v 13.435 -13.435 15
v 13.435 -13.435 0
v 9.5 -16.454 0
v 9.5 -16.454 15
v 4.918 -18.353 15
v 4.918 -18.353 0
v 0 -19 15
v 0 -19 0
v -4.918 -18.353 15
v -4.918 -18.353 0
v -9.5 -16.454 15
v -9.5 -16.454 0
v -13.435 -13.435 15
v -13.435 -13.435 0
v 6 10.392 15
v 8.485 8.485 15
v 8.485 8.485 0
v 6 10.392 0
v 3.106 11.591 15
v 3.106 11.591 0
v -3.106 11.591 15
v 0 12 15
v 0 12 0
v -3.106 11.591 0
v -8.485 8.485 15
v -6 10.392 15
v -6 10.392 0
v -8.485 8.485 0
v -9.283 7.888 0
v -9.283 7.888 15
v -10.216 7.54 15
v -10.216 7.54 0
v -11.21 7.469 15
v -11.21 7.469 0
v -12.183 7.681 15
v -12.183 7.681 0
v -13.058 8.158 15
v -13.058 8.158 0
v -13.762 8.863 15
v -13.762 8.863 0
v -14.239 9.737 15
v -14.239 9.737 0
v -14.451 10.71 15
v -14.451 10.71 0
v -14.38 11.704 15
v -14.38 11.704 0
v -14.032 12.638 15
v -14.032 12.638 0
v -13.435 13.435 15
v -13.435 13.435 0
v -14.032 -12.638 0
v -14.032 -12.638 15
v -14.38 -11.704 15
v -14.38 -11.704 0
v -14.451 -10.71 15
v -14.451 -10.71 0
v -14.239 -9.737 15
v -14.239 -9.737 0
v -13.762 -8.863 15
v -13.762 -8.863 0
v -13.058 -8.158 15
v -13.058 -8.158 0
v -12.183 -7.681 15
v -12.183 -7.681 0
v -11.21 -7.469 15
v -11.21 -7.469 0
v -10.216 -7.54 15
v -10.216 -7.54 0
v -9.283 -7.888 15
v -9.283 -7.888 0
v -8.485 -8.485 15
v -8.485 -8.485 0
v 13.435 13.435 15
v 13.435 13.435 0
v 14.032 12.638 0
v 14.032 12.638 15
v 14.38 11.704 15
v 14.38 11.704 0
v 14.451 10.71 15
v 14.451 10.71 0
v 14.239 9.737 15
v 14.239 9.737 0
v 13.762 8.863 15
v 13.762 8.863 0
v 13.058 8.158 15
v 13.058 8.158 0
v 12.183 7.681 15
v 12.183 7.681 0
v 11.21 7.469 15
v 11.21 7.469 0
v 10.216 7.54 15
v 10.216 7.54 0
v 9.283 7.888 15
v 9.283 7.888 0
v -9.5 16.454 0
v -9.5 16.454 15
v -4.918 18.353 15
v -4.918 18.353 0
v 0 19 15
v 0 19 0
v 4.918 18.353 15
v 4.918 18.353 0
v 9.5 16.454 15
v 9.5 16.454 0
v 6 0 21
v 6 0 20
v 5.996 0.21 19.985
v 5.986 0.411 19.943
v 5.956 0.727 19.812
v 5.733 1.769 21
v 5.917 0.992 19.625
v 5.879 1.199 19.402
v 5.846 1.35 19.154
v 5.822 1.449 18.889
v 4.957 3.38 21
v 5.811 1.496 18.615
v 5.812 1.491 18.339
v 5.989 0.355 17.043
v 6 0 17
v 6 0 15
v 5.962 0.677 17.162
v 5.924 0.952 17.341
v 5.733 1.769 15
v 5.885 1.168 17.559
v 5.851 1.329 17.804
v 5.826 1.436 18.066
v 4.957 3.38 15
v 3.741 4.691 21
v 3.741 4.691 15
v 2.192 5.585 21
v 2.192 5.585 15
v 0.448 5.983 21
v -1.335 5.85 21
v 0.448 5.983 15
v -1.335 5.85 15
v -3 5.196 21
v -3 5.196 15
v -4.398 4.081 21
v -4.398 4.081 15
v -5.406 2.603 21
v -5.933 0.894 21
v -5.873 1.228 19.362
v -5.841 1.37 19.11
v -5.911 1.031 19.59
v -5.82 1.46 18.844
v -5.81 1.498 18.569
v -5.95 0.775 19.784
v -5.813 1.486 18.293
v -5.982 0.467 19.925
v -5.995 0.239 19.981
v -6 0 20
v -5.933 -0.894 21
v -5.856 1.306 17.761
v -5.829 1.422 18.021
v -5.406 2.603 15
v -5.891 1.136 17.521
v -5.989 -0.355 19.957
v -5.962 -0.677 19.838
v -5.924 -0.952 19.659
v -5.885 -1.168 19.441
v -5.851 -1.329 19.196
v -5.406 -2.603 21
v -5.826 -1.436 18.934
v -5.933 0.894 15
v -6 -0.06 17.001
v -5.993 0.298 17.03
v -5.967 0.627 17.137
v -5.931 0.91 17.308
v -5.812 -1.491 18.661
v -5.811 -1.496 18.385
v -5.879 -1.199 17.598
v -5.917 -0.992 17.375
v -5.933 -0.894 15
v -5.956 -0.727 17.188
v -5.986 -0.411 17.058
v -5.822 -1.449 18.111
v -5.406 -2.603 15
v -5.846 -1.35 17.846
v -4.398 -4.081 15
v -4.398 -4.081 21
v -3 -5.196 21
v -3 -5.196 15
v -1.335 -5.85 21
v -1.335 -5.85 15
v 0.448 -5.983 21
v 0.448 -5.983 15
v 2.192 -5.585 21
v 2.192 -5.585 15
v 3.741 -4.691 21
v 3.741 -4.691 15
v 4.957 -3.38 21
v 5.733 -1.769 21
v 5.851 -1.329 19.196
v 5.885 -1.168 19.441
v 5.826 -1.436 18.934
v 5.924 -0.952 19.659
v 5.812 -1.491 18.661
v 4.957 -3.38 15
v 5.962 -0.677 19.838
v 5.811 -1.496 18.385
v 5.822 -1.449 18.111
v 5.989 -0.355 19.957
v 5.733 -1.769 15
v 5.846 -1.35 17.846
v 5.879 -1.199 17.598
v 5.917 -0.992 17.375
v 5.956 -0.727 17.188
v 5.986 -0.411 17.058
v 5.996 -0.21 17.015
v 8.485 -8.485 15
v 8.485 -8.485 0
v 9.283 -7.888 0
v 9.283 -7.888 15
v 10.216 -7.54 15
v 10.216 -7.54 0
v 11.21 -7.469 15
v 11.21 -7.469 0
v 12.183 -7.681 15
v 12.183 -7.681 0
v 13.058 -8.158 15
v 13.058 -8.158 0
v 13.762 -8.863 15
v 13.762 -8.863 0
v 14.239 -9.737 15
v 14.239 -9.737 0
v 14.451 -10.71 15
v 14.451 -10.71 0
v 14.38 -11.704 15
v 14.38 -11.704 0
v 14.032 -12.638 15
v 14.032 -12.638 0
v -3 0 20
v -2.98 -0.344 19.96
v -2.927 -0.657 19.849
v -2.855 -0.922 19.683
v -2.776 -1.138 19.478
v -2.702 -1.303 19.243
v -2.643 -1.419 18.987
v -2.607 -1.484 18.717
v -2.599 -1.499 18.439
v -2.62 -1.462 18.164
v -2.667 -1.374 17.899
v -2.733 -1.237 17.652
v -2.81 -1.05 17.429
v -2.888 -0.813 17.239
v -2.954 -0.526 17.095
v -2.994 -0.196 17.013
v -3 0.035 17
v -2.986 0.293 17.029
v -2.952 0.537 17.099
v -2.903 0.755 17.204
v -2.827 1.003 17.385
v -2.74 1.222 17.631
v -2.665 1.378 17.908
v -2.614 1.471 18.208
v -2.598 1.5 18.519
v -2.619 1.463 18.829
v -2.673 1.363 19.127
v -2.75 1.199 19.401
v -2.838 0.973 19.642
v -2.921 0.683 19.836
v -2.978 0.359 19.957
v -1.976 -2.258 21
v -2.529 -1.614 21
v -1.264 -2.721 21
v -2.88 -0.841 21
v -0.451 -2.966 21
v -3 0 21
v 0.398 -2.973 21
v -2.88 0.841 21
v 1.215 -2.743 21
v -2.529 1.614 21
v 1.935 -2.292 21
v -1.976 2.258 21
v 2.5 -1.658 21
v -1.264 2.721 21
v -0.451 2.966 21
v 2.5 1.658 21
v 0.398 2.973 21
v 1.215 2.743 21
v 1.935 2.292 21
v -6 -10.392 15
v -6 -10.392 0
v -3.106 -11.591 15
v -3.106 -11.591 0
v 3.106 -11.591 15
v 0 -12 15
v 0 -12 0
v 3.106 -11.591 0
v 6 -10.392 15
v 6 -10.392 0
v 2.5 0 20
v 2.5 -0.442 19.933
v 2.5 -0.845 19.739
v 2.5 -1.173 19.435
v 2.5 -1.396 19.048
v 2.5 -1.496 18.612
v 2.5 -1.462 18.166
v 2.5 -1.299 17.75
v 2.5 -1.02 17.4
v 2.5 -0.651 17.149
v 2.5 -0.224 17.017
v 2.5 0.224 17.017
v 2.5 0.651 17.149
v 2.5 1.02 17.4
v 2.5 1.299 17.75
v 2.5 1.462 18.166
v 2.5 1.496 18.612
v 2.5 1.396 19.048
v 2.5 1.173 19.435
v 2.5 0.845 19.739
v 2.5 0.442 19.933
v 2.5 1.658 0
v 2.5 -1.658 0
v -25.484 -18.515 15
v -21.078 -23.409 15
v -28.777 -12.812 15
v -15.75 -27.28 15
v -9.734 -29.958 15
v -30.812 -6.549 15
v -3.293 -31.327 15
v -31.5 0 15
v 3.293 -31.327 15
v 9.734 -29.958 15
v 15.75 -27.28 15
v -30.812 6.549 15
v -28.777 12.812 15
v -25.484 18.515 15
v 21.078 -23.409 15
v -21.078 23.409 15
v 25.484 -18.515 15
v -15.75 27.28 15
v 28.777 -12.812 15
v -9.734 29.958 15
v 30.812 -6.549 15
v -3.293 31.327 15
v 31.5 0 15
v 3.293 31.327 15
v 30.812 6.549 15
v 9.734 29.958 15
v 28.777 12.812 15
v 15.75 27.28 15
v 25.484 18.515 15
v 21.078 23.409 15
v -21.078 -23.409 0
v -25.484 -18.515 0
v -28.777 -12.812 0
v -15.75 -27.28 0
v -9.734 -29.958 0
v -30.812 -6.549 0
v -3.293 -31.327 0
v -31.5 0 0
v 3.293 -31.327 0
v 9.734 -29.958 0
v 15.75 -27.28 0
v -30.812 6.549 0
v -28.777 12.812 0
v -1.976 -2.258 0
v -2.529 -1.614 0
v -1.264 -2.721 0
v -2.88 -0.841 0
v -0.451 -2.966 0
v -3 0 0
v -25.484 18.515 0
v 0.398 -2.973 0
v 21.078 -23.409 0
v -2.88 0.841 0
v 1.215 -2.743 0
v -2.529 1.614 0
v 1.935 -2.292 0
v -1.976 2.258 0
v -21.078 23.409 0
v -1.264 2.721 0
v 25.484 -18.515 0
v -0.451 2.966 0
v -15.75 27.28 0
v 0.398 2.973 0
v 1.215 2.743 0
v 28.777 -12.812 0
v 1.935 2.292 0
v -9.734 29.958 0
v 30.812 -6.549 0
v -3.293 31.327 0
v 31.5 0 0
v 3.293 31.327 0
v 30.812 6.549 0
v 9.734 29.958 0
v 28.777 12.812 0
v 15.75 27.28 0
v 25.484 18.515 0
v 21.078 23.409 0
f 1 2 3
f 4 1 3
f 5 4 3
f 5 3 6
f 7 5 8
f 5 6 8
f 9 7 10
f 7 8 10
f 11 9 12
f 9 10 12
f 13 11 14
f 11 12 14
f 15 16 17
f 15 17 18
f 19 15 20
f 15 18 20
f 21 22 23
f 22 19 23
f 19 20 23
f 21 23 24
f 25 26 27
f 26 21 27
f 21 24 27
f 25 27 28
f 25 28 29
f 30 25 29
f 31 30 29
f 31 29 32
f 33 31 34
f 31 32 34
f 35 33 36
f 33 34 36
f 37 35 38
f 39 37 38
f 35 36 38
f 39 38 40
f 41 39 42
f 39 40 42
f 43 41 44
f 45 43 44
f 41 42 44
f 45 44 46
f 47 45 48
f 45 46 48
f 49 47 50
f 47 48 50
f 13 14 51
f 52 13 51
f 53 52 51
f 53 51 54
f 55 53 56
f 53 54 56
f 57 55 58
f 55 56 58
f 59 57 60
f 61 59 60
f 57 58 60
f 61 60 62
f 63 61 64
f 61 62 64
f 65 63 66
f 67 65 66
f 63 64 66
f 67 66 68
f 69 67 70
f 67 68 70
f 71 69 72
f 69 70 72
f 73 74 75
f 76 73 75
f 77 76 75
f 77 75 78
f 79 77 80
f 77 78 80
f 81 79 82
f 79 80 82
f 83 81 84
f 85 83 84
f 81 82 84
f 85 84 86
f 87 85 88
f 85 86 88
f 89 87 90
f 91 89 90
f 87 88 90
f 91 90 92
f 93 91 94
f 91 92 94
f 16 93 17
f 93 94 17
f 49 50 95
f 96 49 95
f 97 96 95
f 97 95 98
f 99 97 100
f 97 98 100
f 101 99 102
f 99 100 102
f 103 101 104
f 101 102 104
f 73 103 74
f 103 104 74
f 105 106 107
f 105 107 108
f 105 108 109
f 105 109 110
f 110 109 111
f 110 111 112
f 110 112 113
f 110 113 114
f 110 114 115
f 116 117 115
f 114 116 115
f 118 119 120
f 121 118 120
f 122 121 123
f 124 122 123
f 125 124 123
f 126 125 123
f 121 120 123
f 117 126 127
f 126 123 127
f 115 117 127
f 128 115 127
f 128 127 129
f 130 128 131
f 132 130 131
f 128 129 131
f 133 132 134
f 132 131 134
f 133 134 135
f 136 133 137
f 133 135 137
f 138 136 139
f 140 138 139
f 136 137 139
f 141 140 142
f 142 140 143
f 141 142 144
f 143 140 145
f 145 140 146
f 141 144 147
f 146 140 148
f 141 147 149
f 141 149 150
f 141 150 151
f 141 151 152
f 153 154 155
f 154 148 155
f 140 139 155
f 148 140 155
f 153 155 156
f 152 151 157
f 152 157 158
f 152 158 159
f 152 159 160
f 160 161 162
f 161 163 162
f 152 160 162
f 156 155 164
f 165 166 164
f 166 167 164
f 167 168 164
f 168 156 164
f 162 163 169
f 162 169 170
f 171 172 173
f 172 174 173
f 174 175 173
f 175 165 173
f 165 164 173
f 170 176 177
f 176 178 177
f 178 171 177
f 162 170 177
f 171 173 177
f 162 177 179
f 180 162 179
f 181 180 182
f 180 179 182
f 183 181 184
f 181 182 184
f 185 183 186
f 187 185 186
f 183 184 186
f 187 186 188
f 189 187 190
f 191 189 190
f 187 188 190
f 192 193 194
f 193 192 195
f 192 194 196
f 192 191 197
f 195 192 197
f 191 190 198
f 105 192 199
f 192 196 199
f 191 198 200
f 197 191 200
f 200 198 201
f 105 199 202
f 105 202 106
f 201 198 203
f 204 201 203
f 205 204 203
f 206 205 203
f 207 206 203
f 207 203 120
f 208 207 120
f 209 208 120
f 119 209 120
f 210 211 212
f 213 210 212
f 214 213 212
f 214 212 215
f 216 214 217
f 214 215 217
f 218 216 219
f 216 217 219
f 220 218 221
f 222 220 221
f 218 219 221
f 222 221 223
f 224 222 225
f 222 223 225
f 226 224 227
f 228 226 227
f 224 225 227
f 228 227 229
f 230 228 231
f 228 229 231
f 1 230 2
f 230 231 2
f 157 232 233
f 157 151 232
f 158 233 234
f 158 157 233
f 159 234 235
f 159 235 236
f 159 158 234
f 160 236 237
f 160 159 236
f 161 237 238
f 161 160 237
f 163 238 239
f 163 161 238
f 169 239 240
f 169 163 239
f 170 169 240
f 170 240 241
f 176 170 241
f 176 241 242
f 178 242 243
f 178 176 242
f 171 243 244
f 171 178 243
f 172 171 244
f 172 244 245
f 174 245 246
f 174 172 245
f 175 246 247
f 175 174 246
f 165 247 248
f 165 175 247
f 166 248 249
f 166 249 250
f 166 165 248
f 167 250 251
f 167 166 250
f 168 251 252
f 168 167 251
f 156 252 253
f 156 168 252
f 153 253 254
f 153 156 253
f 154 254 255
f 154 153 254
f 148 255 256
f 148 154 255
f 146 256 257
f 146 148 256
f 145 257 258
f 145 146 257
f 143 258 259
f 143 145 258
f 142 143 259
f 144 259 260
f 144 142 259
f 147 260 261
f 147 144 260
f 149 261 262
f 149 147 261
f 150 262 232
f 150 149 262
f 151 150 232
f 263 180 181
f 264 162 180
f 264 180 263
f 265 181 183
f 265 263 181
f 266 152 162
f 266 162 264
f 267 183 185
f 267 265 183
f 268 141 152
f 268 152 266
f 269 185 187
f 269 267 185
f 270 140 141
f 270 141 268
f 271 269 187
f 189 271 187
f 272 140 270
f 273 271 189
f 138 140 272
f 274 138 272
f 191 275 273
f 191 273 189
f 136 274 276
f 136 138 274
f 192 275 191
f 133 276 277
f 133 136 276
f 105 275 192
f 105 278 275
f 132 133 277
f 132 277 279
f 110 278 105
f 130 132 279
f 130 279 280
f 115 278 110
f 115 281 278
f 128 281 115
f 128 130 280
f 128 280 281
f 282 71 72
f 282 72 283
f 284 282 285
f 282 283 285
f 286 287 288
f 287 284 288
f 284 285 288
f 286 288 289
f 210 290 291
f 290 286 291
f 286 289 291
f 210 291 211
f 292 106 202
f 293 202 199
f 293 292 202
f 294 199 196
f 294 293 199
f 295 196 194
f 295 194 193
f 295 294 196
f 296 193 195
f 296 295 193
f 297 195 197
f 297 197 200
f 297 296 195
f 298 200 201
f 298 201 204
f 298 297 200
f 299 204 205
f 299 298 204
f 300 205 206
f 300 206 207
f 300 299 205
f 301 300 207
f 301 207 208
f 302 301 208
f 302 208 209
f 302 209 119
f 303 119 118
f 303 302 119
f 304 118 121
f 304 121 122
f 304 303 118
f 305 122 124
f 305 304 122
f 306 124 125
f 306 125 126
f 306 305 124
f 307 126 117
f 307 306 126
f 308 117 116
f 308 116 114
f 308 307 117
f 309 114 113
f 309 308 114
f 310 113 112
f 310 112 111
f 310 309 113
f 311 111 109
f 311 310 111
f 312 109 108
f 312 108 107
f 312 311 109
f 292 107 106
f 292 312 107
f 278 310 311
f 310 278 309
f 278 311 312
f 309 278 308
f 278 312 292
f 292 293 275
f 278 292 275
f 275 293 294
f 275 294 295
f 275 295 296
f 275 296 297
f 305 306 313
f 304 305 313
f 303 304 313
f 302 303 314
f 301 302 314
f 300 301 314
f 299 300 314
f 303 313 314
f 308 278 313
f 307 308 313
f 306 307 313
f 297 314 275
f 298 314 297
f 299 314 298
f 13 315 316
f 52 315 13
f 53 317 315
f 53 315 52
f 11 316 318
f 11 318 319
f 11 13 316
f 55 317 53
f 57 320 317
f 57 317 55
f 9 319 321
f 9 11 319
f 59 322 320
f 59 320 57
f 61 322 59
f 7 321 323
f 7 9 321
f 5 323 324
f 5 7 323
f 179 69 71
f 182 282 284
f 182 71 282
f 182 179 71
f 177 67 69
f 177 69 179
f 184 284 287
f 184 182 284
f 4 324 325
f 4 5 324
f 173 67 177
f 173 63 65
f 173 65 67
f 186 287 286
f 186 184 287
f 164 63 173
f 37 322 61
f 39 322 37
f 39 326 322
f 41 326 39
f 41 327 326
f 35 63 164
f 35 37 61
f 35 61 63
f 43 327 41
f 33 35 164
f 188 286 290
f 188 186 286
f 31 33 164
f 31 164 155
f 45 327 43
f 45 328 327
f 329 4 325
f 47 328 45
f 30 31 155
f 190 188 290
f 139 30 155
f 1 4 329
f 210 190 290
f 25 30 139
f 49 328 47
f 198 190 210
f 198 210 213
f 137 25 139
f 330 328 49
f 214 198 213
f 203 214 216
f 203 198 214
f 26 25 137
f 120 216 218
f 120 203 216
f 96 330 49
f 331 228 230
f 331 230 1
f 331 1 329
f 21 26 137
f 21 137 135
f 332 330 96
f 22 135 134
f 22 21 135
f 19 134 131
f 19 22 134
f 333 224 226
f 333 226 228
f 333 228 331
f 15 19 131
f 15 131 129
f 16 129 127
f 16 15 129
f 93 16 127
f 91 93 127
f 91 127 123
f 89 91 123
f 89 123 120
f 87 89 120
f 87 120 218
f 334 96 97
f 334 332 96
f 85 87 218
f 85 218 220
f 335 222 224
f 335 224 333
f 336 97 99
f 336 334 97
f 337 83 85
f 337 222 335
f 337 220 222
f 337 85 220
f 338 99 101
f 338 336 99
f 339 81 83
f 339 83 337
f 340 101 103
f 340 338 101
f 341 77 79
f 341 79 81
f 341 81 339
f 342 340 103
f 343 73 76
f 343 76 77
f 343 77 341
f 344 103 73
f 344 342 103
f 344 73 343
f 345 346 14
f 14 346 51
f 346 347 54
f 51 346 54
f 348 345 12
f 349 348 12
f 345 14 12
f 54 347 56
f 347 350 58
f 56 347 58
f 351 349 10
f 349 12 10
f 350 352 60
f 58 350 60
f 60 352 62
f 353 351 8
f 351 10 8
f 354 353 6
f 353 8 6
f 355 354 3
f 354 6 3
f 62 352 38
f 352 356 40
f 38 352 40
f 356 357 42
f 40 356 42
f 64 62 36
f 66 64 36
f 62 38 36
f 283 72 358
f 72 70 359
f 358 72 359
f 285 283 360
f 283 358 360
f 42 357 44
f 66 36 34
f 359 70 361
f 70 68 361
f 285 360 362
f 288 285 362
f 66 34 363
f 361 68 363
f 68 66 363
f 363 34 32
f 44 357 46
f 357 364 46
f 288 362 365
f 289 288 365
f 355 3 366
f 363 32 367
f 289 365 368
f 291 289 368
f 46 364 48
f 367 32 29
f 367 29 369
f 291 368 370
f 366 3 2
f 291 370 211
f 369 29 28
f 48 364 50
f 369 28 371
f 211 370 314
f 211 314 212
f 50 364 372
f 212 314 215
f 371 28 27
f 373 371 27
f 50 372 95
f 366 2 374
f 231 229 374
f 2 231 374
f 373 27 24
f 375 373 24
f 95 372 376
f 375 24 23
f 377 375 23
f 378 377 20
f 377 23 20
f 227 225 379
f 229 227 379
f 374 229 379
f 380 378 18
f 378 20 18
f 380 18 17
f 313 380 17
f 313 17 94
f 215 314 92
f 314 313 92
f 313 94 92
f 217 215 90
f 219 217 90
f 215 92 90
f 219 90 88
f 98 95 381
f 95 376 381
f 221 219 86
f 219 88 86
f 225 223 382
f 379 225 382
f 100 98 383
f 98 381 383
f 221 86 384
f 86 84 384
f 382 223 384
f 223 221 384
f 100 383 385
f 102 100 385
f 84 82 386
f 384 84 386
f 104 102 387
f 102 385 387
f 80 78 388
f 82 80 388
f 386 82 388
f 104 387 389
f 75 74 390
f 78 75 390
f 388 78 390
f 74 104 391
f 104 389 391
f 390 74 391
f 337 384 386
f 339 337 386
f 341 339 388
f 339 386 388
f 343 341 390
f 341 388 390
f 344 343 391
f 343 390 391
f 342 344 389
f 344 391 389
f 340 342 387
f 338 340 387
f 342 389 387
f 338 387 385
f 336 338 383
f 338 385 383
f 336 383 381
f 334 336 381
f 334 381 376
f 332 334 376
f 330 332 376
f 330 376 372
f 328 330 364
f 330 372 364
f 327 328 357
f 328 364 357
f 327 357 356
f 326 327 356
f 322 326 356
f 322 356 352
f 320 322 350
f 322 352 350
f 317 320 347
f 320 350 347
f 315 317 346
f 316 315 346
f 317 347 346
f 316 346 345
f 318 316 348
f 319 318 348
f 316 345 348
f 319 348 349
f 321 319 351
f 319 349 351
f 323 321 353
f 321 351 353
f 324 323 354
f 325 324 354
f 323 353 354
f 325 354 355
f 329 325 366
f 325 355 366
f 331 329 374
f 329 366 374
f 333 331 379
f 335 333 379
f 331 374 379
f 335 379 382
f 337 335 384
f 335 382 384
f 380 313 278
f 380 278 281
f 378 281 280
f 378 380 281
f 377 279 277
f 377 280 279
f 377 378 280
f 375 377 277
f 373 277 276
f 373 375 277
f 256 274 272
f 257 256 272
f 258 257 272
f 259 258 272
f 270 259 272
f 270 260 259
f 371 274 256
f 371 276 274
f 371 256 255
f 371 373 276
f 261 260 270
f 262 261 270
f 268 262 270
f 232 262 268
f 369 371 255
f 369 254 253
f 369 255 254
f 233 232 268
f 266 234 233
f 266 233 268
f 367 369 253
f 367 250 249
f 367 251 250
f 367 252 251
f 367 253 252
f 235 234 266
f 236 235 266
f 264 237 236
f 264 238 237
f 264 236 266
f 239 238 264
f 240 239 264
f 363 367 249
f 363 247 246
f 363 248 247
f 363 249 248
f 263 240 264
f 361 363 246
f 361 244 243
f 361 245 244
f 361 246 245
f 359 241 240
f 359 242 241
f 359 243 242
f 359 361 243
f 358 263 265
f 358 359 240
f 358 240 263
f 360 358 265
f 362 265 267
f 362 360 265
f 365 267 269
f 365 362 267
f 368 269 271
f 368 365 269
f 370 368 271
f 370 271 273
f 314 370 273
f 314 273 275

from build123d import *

# Parameters (mm, degrees)
SKETCH_1_R               = 31.5
EXTRUDE_1_DEPTH          = 15
SKETCH_3_R               = 3
CUT_EXTRUDE_2_DEPTH      = 48.005318848
SKETCH_14_R              = 6
SKETCH_14_R_2            = 3
EXTRUDE_3_DEPTH          = 6
EXTRUDE_START            = -21
EXTRUDE_4_DEPTH          = 21
CUT_EXTRUDE_3_DEPTH      = 50.249365478
CUT_EXTRUDE_3_DEPTH_BACK = 50.249365478
SKETCH_18_R              = 1.5
CUT_EXTRUDE_5_DEPTH      = 48.00531888
CUT_EXTRUDE_5_DEPTH_BACK = 48.00531888


with BuildPart() as part:
    # 草图1 → 凸台-拉伸1 (new body)
    with BuildSketch(Plane.XY):
        Circle(SKETCH_1_R)
    extrude(amount=EXTRUDE_1_DEPTH)

    # 草图3 → 切除-拉伸2 (cut, through all)
    with BuildSketch(Plane(origin=(0, 0, 0), x_dir=(-1, 0, 0), z_dir=(0, 0, -1))):
        Circle(SKETCH_3_R)
    extrude(amount=-CUT_EXTRUDE_2_DEPTH, mode=Mode.SUBTRACT)

    # 草图14 → 凸台-拉伸3 (add)
    with BuildSketch(Plane.XY.offset(15)):
        Circle(SKETCH_14_R)
        with Locations(Location((0, 0, 0), (0, 0, 180))):
            Circle(SKETCH_14_R_2, mode=Mode.SUBTRACT)
    extrude(amount=EXTRUDE_3_DEPTH)

    # 草图19 → 凸台-拉伸4 (add)
    with BuildSketch(Plane.XY.offset(21).offset(EXTRUDE_START)):
        with BuildLine():
            Line((2.5, 1.658312395), (2.5, -1.658312395))
            ThreePointArc((2.5, -1.658312395), (3, 0), (2.5, 1.658312395))
        make_face()
    extrude(amount=EXTRUDE_4_DEPTH)

    # 草图18 → 切除-拉伸3 (cut, two sides: drawn at the far end of the back side and taken through both)
    with BuildSketch(Plane(origin=(0, 0, 0), x_dir=(0, 0, -1), z_dir=(1, 0, 0)).offset(-CUT_EXTRUDE_3_DEPTH_BACK)):
        with Locations(Location((-18.5, 0, 0), (0, 0, 180))):
            Circle(SKETCH_18_R)
    extrude(amount=CUT_EXTRUDE_3_DEPTH + CUT_EXTRUDE_3_DEPTH_BACK, mode=Mode.SUBTRACT)

    # 草图20 → 切除-拉伸5 (cut, two sides: drawn at the far end of the back side and taken through both)
    with BuildSketch(Plane.XY.offset(15).offset(-CUT_EXTRUDE_5_DEPTH_BACK)):
        with BuildLine():
            ThreePointArc((8.485281374, 8.485281374), (0, 12), (-8.485281374, 8.485281374))
            ThreePointArc((-8.485281374, 8.485281374), (-13.435028843, 8.485281374), (-13.435028843, 13.435028843))
            ThreePointArc((-13.435028843, 13.435028843), (0, 19), (13.435028843, 13.435028843))
            ThreePointArc((13.435028843, 13.435028843), (13.435028843, 8.485281374), (8.485281374, 8.485281374))
        make_face()
        with BuildLine():
            ThreePointArc((8.485281374, -8.485281374), (13.435028843, -8.485281374), (13.435028843, -13.435028843))
            ThreePointArc((13.435028843, -13.435028843), (0, -19), (-13.435028843, -13.435028843))
            ThreePointArc((-13.435028843, -13.435028843), (-13.435028843, -8.485281374), (-8.485281374, -8.485281374))
            ThreePointArc((-8.485281374, -8.485281374), (0, -12), (8.485281374, -8.485281374))
        make_face()
    extrude(amount=CUT_EXTRUDE_5_DEPTH + CUT_EXTRUDE_5_DEPTH_BACK, mode=Mode.SUBTRACT)


solid = part.part
